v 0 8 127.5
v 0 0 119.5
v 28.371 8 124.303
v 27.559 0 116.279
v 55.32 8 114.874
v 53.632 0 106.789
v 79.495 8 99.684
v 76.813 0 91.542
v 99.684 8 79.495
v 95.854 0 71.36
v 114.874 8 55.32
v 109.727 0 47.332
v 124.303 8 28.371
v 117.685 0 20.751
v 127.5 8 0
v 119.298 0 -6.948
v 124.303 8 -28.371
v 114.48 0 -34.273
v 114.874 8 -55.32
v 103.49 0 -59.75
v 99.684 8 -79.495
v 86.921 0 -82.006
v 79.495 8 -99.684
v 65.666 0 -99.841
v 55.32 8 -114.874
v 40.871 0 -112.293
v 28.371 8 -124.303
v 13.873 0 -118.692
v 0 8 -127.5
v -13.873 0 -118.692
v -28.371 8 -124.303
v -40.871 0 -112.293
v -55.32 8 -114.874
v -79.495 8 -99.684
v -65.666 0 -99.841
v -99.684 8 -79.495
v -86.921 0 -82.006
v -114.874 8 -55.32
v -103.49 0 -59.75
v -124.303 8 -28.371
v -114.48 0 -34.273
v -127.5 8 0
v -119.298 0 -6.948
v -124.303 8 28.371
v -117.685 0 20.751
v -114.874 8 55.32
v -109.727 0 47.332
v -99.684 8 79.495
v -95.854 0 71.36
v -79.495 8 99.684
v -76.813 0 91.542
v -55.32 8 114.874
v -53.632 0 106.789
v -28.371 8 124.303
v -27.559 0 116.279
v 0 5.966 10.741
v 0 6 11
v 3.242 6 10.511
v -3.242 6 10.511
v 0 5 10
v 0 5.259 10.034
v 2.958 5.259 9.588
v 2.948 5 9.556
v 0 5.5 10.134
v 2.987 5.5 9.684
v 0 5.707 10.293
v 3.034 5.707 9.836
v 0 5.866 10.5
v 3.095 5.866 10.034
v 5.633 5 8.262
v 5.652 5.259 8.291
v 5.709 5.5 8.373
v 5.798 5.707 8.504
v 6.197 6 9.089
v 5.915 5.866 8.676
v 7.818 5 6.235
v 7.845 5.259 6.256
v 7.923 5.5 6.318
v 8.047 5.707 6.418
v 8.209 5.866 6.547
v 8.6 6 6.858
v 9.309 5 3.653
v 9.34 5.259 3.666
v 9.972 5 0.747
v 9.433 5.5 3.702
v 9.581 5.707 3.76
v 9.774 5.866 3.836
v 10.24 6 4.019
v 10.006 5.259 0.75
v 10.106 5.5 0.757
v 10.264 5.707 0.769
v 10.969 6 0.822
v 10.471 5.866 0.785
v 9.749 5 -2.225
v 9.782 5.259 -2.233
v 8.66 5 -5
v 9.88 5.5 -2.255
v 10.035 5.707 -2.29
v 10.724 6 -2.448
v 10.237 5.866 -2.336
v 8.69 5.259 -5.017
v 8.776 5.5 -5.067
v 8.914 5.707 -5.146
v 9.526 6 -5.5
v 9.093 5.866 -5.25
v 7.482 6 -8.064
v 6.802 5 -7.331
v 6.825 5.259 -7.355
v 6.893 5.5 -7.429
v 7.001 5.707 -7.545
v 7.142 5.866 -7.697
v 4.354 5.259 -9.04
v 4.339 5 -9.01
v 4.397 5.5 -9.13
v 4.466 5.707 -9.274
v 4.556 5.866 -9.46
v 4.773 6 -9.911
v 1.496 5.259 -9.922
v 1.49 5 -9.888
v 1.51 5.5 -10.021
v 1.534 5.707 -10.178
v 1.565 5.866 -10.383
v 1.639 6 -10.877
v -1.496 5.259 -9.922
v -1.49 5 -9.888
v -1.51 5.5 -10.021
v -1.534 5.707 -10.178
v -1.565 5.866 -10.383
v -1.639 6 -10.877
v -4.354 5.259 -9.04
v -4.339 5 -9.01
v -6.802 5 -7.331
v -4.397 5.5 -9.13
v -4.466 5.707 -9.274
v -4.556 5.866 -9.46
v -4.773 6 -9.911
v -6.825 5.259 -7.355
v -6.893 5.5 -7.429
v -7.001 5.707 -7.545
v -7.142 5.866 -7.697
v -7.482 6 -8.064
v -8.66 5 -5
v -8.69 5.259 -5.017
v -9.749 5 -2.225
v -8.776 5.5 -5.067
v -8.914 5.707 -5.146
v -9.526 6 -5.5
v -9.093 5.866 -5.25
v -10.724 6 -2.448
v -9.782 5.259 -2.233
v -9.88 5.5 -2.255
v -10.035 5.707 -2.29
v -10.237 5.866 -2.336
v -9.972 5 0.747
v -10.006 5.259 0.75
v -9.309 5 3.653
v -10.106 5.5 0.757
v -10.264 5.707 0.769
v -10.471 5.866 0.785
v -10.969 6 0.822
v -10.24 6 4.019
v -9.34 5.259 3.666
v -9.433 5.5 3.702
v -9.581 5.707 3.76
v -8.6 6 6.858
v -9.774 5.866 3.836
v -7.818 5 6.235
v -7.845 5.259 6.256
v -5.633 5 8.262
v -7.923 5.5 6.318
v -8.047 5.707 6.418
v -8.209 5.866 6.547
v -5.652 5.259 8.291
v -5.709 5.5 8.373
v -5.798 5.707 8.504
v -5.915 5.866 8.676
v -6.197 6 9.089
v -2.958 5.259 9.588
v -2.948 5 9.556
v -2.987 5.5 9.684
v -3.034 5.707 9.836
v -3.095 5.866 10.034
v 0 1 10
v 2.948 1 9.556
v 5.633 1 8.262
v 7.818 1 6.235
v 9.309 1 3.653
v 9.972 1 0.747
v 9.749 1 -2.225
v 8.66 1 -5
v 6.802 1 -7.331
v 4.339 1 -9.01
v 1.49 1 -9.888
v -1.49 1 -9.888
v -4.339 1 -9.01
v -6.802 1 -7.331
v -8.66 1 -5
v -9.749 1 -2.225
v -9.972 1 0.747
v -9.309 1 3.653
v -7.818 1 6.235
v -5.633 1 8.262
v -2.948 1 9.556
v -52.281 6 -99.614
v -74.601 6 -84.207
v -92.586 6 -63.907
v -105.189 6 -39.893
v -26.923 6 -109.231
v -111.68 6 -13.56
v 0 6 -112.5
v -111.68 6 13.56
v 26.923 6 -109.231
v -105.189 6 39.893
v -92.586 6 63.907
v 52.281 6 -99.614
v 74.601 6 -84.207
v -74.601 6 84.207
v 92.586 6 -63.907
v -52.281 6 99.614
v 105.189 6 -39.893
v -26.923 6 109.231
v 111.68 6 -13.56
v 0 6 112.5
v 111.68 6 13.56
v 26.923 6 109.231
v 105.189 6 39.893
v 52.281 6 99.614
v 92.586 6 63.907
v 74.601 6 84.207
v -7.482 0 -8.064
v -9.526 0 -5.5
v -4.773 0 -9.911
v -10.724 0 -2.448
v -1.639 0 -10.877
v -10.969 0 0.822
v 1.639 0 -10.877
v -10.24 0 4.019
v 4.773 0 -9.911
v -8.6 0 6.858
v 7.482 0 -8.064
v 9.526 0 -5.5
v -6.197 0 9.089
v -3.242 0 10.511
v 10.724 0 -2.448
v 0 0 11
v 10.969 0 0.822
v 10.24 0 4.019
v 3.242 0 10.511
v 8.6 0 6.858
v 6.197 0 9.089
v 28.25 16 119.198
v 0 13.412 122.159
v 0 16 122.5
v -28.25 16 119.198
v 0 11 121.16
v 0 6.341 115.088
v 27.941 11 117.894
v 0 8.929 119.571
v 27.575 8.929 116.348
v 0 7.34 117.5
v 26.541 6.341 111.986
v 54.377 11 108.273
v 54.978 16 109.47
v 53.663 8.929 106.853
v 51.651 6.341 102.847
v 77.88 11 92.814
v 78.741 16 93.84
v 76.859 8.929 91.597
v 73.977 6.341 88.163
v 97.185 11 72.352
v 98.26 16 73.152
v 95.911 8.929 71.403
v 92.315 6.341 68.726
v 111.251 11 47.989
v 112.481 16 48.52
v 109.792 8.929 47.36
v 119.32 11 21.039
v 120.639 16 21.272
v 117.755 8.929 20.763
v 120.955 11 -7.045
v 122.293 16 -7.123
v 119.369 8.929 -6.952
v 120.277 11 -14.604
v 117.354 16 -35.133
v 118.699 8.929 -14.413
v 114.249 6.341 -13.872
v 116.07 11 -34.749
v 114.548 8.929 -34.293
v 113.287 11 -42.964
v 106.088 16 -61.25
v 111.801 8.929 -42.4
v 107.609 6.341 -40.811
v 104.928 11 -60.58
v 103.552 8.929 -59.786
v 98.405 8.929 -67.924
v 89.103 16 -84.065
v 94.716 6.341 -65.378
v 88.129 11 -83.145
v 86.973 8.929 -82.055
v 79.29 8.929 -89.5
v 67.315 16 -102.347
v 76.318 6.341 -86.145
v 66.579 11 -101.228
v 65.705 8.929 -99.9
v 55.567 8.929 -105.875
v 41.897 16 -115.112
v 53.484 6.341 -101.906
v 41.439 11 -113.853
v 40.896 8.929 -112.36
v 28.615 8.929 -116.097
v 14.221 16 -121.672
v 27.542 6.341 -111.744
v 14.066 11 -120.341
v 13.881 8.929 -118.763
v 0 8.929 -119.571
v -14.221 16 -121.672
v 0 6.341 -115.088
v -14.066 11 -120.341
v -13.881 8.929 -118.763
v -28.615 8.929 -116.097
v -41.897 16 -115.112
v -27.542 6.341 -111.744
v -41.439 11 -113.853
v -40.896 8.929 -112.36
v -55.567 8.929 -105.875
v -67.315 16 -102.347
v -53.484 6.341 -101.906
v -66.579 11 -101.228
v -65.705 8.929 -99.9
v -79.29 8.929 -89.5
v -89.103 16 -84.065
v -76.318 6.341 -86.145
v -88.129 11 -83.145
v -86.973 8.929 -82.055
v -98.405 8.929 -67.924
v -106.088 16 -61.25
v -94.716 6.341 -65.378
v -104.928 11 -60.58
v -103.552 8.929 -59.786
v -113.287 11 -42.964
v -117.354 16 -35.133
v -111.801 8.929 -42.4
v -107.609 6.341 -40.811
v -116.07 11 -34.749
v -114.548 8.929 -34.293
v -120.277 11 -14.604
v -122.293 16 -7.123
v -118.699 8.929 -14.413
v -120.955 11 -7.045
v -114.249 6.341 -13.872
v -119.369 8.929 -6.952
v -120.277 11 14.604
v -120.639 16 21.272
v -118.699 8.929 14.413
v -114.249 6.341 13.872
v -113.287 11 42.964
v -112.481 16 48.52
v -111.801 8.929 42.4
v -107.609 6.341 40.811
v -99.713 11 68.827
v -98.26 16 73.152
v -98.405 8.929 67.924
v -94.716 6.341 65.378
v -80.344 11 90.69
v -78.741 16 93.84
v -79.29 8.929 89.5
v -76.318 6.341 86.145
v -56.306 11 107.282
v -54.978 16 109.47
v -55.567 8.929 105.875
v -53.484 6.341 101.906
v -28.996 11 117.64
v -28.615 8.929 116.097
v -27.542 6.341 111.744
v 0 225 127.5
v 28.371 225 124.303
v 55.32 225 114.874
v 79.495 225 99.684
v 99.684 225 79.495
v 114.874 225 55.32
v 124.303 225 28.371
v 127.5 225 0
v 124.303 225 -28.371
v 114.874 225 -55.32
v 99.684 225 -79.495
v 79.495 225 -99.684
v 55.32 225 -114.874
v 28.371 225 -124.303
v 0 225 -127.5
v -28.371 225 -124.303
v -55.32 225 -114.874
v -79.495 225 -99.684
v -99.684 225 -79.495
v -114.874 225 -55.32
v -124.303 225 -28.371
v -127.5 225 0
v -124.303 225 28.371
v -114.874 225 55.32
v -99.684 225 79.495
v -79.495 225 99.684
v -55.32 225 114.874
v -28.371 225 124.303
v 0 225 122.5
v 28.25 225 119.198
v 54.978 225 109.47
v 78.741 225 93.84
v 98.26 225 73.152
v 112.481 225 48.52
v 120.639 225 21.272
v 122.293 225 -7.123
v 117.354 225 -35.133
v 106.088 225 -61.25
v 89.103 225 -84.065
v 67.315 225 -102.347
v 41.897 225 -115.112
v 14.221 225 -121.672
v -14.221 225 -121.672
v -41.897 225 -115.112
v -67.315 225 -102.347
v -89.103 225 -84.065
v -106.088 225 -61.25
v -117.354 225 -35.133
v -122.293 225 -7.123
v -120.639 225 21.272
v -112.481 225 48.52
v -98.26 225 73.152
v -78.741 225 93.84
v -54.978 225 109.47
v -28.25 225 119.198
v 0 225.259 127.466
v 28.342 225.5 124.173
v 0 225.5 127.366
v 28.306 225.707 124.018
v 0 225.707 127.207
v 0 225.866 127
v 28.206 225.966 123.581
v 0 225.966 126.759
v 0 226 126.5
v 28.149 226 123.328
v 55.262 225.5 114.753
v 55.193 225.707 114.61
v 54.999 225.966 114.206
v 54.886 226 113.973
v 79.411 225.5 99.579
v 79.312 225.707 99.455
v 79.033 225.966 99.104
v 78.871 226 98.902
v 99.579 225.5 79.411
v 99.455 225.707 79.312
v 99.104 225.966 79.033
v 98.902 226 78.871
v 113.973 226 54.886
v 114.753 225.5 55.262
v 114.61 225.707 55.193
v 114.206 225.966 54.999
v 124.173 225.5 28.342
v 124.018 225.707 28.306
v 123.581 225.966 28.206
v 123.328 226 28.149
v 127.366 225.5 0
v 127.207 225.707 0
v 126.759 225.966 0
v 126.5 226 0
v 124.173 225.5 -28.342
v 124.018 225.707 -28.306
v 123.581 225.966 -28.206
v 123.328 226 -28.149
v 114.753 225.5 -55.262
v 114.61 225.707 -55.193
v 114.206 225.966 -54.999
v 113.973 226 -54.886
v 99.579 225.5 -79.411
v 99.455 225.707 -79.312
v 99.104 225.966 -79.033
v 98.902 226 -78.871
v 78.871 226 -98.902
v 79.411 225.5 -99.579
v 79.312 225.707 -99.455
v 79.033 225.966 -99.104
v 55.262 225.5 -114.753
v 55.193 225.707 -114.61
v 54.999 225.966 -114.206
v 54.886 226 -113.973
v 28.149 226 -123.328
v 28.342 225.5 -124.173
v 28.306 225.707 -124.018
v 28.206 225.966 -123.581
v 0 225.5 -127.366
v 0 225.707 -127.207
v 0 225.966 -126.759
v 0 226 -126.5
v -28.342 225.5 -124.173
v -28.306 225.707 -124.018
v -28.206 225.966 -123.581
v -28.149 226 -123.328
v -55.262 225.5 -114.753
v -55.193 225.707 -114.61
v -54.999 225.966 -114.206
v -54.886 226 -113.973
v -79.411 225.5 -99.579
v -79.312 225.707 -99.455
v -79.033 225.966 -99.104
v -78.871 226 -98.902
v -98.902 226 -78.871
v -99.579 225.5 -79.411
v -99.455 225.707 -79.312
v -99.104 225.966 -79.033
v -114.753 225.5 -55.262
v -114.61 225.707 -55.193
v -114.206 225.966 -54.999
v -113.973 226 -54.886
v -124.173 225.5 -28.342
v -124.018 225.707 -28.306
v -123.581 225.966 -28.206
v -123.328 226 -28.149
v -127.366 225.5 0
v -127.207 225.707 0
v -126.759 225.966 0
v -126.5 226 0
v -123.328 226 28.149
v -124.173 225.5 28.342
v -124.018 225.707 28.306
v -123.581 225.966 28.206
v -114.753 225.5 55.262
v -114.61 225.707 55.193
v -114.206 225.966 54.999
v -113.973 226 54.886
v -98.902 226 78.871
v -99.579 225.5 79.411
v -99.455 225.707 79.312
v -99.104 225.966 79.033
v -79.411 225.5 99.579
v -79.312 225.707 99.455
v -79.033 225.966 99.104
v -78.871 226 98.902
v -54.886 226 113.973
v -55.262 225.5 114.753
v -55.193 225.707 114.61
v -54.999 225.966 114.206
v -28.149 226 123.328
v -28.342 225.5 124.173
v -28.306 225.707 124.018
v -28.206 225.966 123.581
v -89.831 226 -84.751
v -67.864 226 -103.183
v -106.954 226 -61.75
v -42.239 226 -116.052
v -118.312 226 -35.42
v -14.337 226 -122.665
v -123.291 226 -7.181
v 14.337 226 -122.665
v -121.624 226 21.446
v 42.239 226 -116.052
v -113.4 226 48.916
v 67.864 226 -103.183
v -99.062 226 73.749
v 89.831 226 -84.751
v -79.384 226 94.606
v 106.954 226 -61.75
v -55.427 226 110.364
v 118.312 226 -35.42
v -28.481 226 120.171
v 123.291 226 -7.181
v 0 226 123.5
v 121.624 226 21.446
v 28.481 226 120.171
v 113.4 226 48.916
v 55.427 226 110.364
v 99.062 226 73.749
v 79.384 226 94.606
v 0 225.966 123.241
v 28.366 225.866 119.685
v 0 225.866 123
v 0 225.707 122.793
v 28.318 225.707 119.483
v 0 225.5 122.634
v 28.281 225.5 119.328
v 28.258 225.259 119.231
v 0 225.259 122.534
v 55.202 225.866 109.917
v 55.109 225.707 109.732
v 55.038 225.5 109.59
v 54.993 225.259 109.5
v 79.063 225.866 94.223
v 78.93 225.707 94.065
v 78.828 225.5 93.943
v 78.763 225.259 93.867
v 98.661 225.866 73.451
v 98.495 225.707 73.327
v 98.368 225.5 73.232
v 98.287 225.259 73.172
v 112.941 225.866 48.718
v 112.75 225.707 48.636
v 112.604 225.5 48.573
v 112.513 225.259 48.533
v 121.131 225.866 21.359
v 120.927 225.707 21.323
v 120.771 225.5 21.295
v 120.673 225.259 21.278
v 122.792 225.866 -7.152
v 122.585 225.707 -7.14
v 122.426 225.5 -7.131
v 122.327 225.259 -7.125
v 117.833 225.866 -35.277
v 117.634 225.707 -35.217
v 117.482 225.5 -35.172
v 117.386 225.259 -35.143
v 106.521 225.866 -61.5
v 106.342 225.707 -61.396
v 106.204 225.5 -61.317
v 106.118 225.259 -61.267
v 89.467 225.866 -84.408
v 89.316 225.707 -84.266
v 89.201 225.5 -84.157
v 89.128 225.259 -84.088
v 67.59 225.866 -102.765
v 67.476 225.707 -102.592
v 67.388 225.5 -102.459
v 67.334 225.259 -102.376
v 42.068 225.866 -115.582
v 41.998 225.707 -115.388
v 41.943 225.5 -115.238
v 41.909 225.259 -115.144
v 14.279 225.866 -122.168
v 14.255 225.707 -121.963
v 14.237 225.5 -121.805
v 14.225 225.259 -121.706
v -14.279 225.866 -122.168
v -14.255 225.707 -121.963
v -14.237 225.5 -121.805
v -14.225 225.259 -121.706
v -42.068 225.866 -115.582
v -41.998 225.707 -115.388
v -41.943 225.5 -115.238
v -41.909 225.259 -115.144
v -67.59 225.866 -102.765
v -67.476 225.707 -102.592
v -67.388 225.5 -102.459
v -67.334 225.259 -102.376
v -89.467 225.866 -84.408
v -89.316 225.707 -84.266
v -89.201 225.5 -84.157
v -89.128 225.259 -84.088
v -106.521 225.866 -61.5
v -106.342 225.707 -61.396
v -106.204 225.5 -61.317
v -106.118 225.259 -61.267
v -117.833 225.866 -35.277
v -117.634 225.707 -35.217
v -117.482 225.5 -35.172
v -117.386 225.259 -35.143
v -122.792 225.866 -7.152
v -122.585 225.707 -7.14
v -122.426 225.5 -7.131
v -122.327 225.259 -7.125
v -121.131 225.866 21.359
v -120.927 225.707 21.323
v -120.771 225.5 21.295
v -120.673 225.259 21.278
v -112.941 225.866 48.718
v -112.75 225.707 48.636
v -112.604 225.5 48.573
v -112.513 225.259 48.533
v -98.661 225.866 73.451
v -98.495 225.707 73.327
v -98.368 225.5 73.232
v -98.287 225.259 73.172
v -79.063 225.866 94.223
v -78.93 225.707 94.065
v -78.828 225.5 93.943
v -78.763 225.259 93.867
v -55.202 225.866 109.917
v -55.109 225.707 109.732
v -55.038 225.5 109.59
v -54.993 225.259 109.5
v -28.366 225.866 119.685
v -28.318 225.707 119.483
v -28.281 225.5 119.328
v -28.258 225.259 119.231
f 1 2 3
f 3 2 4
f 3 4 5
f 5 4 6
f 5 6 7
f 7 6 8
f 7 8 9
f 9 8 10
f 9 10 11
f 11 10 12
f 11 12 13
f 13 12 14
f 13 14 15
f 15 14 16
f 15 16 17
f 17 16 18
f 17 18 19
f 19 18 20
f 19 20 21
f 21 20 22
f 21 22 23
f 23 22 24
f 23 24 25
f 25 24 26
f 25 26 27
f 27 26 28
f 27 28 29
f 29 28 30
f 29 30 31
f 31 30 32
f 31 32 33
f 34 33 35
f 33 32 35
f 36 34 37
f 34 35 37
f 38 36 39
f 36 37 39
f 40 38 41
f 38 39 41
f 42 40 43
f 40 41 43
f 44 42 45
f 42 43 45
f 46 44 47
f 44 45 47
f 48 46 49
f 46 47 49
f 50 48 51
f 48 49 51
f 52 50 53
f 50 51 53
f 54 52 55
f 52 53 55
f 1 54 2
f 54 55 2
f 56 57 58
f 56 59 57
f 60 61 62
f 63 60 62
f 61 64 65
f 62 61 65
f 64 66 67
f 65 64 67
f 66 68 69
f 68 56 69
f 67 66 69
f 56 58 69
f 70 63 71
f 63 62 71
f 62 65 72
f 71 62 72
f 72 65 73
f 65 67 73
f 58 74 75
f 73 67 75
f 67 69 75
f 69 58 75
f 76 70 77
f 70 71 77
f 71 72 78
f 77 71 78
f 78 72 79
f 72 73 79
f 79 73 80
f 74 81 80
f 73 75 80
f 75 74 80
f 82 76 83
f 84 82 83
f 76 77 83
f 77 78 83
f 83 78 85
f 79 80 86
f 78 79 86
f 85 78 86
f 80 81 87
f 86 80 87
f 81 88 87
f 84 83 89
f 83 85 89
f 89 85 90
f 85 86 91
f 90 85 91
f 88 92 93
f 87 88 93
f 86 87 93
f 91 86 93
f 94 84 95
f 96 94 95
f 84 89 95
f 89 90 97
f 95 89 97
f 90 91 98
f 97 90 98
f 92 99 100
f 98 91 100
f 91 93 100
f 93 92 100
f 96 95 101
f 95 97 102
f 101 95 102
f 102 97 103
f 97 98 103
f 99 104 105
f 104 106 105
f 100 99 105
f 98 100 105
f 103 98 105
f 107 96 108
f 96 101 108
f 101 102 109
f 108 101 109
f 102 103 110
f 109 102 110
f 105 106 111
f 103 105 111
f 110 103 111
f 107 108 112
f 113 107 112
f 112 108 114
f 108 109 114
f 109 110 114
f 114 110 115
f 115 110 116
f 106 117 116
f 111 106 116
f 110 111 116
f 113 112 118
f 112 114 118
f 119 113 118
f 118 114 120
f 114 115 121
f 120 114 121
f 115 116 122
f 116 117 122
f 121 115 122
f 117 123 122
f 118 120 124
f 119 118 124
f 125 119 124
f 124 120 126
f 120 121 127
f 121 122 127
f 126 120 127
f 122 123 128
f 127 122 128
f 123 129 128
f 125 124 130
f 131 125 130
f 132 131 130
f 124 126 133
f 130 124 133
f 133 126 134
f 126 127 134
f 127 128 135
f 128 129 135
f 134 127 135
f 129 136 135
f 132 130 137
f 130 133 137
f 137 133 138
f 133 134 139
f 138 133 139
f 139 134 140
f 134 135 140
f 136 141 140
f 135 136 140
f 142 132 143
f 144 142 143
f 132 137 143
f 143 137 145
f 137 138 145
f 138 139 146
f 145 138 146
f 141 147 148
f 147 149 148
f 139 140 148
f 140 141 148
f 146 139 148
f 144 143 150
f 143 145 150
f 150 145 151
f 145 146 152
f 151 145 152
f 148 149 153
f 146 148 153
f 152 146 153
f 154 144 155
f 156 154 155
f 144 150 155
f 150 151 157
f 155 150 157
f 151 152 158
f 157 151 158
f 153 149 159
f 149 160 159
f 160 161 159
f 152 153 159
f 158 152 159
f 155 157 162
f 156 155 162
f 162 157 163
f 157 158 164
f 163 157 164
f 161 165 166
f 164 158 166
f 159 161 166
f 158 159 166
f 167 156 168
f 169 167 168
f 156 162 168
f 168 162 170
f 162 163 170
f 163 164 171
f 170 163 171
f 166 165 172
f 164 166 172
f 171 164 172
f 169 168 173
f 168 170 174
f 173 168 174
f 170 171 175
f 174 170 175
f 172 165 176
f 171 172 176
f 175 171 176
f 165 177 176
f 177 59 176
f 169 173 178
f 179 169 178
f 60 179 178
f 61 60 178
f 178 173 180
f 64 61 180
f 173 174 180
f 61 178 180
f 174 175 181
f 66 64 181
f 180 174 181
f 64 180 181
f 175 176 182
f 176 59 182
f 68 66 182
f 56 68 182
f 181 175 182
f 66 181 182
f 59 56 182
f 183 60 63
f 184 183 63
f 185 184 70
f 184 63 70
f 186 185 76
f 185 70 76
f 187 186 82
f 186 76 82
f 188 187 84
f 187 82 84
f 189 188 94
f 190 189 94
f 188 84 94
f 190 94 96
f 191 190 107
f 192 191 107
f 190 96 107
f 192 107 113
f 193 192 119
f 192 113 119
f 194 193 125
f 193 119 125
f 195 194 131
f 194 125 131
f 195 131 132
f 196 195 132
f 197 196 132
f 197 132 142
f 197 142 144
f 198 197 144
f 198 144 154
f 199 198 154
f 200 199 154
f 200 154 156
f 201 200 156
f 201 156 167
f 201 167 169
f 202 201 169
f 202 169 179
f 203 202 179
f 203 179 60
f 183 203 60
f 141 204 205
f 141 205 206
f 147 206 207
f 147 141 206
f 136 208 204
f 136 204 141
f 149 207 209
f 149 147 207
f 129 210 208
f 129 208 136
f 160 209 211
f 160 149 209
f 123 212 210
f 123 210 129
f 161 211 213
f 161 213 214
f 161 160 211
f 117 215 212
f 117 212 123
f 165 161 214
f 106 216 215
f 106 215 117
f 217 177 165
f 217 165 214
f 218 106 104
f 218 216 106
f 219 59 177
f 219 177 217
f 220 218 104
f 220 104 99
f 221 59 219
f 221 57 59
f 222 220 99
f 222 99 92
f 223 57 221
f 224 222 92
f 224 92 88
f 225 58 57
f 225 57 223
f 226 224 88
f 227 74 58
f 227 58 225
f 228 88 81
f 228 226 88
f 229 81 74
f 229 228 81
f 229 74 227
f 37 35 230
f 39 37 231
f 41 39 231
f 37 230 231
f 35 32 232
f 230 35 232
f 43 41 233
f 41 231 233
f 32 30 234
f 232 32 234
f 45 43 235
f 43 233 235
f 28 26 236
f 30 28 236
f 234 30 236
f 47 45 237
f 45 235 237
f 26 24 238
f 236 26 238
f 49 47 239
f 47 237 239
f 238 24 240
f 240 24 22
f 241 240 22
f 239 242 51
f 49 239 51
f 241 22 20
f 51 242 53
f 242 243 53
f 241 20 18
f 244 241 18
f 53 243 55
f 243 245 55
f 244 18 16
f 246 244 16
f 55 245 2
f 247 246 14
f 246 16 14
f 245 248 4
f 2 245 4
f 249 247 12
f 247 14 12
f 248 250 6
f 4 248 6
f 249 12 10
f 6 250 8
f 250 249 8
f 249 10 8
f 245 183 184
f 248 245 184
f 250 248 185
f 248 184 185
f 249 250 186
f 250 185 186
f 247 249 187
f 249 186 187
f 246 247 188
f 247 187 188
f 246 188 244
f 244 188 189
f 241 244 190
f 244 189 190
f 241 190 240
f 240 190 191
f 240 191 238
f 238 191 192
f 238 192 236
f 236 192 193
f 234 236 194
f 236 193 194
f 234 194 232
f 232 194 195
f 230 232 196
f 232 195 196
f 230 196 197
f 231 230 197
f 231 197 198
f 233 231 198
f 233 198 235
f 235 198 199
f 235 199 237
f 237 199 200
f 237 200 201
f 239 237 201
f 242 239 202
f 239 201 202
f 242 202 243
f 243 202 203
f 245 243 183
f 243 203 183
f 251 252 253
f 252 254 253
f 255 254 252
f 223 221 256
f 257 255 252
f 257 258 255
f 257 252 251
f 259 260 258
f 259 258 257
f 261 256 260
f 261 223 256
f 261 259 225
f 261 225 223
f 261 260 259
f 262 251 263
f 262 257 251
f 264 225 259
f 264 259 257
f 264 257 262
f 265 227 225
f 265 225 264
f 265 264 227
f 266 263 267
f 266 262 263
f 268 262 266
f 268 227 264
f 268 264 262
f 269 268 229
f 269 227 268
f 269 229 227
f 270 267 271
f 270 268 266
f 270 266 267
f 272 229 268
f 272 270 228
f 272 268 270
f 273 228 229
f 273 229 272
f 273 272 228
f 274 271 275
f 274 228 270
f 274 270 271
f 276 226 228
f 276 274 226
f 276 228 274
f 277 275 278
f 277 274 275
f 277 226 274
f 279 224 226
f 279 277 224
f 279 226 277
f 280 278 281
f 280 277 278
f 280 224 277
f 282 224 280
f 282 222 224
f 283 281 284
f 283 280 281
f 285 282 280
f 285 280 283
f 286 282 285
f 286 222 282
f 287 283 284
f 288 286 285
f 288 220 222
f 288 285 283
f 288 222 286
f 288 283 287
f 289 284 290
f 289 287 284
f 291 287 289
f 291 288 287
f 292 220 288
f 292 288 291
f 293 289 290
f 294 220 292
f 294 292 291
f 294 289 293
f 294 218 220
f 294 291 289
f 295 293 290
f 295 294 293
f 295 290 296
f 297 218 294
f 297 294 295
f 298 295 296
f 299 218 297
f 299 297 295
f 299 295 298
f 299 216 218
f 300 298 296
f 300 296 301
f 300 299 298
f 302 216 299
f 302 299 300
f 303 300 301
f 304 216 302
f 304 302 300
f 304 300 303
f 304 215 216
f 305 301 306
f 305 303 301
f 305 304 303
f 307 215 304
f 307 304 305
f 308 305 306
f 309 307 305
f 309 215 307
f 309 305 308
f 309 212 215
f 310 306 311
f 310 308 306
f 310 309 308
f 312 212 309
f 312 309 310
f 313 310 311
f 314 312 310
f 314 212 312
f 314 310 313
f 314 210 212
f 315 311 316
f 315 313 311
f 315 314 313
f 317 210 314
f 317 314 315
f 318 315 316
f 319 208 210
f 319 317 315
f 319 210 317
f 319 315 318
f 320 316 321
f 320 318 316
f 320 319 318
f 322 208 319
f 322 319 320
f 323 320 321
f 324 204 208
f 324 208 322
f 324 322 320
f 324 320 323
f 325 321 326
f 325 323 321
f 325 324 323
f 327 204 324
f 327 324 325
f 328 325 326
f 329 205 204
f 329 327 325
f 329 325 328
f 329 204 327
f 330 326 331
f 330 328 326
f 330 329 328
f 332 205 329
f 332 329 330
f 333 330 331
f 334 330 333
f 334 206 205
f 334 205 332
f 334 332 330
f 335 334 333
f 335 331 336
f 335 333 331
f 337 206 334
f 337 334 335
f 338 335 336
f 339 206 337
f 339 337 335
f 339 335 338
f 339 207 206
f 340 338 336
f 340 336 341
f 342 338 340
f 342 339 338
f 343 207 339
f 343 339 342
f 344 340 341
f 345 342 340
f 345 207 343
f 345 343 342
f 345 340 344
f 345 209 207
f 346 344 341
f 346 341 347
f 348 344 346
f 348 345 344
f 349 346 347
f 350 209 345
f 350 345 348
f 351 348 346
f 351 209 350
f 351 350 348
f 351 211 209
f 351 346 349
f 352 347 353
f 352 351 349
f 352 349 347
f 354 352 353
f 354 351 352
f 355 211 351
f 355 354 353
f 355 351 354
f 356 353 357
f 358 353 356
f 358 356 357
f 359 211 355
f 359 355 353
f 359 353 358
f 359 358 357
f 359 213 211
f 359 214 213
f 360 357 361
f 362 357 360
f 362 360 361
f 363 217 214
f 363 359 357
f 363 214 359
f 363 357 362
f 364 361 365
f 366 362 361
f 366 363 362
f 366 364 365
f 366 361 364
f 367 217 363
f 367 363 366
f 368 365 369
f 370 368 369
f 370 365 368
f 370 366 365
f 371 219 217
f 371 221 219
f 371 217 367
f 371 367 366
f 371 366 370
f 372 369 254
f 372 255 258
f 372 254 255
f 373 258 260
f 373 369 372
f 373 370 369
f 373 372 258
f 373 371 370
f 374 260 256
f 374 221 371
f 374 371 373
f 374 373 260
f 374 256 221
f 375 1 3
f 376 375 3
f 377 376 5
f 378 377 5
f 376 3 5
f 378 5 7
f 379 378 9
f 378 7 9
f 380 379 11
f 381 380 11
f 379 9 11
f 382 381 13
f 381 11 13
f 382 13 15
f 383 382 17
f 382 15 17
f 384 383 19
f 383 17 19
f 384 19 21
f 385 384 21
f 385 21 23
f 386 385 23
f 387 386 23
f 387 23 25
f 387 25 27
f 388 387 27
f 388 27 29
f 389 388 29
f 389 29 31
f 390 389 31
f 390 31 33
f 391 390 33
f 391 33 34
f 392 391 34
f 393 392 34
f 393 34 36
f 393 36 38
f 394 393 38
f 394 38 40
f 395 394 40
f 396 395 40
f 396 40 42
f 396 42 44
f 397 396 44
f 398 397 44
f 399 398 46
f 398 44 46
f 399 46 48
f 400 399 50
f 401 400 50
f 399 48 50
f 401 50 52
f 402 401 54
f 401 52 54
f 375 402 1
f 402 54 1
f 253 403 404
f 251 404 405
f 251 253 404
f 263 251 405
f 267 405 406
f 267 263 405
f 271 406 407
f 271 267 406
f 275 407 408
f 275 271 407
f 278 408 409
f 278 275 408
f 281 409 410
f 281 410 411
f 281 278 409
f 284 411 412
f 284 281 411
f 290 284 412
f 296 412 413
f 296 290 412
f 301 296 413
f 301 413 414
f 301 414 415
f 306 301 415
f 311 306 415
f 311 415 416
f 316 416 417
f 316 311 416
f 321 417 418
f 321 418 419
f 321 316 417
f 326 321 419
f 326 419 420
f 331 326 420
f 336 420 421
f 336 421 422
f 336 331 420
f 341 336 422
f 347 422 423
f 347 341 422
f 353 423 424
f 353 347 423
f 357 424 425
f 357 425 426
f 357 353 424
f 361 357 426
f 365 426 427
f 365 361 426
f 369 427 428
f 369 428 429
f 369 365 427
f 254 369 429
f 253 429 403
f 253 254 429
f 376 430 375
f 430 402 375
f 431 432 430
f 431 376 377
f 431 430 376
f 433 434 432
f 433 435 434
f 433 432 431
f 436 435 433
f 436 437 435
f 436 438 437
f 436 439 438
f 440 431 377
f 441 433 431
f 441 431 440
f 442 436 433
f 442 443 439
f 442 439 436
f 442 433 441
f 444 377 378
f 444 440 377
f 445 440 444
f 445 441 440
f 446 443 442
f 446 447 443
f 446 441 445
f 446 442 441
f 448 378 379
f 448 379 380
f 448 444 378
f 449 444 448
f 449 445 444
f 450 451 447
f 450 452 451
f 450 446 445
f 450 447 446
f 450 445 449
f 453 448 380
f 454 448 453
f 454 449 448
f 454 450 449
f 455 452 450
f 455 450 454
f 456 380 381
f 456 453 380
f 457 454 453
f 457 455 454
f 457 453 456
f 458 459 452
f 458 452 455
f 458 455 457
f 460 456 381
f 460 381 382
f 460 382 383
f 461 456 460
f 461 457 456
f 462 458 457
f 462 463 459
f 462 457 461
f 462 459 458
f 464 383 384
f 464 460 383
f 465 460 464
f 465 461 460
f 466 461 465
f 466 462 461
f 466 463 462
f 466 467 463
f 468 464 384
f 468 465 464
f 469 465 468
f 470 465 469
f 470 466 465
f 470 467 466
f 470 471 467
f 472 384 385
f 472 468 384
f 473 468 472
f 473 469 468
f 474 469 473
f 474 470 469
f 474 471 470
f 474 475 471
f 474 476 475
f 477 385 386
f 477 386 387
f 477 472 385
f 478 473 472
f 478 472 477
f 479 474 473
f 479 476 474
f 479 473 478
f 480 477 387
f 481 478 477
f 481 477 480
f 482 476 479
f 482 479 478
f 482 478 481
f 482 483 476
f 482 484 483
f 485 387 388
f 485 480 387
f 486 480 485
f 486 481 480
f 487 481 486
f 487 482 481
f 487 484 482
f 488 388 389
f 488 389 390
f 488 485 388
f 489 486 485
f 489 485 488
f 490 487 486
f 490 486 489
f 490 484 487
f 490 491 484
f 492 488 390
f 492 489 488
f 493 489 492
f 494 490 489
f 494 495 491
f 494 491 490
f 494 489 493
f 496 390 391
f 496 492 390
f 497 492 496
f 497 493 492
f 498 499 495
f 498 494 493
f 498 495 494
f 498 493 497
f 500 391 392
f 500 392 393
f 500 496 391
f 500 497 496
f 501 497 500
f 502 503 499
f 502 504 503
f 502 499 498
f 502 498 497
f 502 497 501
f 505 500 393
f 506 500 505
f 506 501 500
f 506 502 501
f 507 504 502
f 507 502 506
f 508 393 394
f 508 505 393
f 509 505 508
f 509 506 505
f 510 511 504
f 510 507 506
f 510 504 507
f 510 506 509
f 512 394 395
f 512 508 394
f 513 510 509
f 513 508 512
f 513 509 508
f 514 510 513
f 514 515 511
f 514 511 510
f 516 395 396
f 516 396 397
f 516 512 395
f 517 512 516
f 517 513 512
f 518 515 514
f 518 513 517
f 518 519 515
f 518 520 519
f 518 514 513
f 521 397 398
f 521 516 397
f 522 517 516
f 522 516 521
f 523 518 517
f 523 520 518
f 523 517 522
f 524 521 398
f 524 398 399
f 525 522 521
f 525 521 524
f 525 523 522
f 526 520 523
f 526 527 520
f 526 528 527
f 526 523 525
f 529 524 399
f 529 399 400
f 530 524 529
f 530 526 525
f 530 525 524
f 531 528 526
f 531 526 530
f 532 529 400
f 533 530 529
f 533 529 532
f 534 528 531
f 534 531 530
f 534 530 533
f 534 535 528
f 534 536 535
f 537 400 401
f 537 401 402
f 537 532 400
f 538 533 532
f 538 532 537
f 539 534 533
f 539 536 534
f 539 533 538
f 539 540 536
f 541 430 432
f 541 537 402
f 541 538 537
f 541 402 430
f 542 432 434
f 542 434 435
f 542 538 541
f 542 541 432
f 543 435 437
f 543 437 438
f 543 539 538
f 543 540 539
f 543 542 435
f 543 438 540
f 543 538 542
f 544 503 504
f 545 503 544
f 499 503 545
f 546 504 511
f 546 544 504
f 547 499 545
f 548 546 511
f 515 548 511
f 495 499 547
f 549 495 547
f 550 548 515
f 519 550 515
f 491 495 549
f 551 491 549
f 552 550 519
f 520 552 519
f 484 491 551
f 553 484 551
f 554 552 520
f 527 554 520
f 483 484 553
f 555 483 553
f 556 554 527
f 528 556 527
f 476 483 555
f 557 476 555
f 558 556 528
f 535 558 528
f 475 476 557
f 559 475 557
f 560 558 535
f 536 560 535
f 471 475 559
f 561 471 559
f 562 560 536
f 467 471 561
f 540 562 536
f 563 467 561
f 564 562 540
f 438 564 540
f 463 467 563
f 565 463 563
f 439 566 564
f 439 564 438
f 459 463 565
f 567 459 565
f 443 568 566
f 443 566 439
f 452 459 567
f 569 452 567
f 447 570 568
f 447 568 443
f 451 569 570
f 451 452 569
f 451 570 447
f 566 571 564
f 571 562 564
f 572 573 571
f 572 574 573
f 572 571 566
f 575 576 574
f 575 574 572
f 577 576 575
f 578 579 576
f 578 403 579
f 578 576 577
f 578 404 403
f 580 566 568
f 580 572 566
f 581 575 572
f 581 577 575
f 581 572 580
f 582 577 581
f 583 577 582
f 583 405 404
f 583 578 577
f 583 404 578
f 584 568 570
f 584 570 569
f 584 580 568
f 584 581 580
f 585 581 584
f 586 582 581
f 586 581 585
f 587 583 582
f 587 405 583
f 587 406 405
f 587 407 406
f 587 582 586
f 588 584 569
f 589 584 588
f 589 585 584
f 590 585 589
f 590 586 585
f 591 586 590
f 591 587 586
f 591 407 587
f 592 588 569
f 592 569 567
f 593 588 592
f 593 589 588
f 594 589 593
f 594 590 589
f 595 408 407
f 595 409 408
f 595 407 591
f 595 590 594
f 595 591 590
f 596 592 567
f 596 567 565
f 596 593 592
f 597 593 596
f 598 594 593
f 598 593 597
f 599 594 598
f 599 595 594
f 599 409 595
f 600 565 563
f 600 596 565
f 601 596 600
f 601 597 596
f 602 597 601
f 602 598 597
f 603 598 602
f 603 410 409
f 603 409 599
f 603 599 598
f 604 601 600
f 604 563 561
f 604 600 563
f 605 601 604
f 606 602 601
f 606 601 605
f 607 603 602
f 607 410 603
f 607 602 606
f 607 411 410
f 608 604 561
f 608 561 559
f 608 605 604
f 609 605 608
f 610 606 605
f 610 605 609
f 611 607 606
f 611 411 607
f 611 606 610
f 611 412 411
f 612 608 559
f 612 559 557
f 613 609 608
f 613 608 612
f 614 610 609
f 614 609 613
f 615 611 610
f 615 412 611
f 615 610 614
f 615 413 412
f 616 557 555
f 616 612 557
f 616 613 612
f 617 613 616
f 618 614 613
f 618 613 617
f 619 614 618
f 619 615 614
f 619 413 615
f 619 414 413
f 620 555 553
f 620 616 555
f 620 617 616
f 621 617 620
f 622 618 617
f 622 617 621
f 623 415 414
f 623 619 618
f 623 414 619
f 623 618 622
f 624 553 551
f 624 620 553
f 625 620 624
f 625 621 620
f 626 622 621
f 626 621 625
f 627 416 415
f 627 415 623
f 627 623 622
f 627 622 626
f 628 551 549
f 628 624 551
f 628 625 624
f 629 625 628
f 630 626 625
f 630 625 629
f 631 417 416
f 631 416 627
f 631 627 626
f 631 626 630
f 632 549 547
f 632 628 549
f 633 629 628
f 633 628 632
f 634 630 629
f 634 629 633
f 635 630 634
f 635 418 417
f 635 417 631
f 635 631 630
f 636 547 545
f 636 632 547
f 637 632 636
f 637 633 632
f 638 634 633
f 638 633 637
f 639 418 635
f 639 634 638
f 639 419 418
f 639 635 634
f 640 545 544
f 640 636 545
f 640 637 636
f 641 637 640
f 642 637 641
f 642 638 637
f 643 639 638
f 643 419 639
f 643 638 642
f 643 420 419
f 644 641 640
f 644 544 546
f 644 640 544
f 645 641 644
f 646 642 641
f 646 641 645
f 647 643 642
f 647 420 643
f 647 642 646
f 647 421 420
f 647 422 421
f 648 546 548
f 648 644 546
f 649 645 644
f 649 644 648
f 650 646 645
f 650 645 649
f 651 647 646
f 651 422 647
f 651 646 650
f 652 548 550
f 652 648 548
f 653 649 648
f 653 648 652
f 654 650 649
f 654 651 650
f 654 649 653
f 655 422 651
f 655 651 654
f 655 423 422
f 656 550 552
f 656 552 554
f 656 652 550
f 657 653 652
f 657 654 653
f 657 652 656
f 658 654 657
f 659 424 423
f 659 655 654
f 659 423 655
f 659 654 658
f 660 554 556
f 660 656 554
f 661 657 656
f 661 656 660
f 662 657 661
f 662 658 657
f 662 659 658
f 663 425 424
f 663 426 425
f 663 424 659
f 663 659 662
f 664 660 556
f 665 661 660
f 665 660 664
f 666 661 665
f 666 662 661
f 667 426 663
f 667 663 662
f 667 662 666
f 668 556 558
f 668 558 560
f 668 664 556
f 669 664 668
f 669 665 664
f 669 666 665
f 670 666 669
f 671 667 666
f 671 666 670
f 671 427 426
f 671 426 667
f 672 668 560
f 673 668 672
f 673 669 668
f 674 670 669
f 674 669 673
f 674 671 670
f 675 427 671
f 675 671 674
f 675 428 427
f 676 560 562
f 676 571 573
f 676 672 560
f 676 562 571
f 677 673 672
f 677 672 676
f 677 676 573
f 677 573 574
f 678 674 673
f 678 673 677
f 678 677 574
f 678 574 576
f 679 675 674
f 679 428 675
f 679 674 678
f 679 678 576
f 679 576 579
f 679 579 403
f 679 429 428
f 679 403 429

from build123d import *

# Parameters (mm, degrees)
SKETCH_1_R          = 127.5
EXTRUDE_1_DEPTH     = 6
SKETCH_2_R          = 127.5
SKETCH_2_R_2        = 122.5
EXTRUDE_2_DEPTH     = 220
SKETCH_3_R          = 10
CUT_EXTRUDE_1_DEPTH = 200
FILLET_1_R          = 10
CHAMFER_1_SIZE      = 8
FILLET_2_R          = 1
CHAMFER_2_SIZE      = 1
FILLET_3_R          = 1


with BuildPart() as part:
    # 草图1 → 凸台-拉伸1 (new body)
    with BuildSketch(Plane(origin=(0, 0, 0), x_dir=(1, 0, 0), z_dir=(0, 1, 0))):
        with Locations(Location((0, 0, 0), (0, 0, 270))):
            Circle(SKETCH_1_R)
    extrude(amount=EXTRUDE_1_DEPTH)

    # 草图2 → 凸台-拉伸2 (add)
    with BuildSketch(Plane(origin=(0, 6, 0), x_dir=(1, 0, 0), z_dir=(0, 1, 0))):
        with Locations(Location((0, 0, 0), (0, 0, 270))):
            Circle(SKETCH_2_R)
        with Locations(Location((0, 0, 0), (0, 0, 270))):
            Circle(SKETCH_2_R_2, mode=Mode.SUBTRACT)
    extrude(amount=EXTRUDE_2_DEPTH)

    # 草图3 → 切除-拉伸1 (cut)
    with BuildSketch(Plane(origin=(0, 6, 0), x_dir=(1, 0, 0), z_dir=(0, 1, 0))):
        with Locations(Location((0, 0, 0), (0, 0, 270))):
            Circle(SKETCH_3_R)
    extrude(amount=-CUT_EXTRUDE_1_DEPTH, mode=Mode.SUBTRACT)

    # 圆角1
    fillet_1_edges = [part.edges().sort_by_distance(p)[0] for p in [
        (0, 6, -122.5),
    ]]
    fillet(fillet_1_edges, radius=FILLET_1_R)

    # 倒角1
    chamfer_1_edges = [part.edges().sort_by_distance(p)[0] for p in [
        (0, 0, -127.5),
    ]]
    chamfer(chamfer_1_edges, length=CHAMFER_1_SIZE)

    # 圆角2
    fillet_2_edges = [part.edges().sort_by_distance(p)[0] for p in [
        (0, 226, -127.5),
        (0, 226, -122.5),
    ]]
    fillet(fillet_2_edges, radius=FILLET_2_R)

    # 倒角2
    chamfer_2_edges = [part.edges().sort_by_distance(p)[0] for p in [
        (0, 0, -10),
    ]]
    chamfer(chamfer_2_edges, length=CHAMFER_2_SIZE)

    # 圆角3
    fillet_3_edges = [part.edges().sort_by_distance(p)[0] for p in [
        (0, 6, -10),
    ]]
    fillet(fillet_3_edges, radius=FILLET_3_R)


solid = part.part
